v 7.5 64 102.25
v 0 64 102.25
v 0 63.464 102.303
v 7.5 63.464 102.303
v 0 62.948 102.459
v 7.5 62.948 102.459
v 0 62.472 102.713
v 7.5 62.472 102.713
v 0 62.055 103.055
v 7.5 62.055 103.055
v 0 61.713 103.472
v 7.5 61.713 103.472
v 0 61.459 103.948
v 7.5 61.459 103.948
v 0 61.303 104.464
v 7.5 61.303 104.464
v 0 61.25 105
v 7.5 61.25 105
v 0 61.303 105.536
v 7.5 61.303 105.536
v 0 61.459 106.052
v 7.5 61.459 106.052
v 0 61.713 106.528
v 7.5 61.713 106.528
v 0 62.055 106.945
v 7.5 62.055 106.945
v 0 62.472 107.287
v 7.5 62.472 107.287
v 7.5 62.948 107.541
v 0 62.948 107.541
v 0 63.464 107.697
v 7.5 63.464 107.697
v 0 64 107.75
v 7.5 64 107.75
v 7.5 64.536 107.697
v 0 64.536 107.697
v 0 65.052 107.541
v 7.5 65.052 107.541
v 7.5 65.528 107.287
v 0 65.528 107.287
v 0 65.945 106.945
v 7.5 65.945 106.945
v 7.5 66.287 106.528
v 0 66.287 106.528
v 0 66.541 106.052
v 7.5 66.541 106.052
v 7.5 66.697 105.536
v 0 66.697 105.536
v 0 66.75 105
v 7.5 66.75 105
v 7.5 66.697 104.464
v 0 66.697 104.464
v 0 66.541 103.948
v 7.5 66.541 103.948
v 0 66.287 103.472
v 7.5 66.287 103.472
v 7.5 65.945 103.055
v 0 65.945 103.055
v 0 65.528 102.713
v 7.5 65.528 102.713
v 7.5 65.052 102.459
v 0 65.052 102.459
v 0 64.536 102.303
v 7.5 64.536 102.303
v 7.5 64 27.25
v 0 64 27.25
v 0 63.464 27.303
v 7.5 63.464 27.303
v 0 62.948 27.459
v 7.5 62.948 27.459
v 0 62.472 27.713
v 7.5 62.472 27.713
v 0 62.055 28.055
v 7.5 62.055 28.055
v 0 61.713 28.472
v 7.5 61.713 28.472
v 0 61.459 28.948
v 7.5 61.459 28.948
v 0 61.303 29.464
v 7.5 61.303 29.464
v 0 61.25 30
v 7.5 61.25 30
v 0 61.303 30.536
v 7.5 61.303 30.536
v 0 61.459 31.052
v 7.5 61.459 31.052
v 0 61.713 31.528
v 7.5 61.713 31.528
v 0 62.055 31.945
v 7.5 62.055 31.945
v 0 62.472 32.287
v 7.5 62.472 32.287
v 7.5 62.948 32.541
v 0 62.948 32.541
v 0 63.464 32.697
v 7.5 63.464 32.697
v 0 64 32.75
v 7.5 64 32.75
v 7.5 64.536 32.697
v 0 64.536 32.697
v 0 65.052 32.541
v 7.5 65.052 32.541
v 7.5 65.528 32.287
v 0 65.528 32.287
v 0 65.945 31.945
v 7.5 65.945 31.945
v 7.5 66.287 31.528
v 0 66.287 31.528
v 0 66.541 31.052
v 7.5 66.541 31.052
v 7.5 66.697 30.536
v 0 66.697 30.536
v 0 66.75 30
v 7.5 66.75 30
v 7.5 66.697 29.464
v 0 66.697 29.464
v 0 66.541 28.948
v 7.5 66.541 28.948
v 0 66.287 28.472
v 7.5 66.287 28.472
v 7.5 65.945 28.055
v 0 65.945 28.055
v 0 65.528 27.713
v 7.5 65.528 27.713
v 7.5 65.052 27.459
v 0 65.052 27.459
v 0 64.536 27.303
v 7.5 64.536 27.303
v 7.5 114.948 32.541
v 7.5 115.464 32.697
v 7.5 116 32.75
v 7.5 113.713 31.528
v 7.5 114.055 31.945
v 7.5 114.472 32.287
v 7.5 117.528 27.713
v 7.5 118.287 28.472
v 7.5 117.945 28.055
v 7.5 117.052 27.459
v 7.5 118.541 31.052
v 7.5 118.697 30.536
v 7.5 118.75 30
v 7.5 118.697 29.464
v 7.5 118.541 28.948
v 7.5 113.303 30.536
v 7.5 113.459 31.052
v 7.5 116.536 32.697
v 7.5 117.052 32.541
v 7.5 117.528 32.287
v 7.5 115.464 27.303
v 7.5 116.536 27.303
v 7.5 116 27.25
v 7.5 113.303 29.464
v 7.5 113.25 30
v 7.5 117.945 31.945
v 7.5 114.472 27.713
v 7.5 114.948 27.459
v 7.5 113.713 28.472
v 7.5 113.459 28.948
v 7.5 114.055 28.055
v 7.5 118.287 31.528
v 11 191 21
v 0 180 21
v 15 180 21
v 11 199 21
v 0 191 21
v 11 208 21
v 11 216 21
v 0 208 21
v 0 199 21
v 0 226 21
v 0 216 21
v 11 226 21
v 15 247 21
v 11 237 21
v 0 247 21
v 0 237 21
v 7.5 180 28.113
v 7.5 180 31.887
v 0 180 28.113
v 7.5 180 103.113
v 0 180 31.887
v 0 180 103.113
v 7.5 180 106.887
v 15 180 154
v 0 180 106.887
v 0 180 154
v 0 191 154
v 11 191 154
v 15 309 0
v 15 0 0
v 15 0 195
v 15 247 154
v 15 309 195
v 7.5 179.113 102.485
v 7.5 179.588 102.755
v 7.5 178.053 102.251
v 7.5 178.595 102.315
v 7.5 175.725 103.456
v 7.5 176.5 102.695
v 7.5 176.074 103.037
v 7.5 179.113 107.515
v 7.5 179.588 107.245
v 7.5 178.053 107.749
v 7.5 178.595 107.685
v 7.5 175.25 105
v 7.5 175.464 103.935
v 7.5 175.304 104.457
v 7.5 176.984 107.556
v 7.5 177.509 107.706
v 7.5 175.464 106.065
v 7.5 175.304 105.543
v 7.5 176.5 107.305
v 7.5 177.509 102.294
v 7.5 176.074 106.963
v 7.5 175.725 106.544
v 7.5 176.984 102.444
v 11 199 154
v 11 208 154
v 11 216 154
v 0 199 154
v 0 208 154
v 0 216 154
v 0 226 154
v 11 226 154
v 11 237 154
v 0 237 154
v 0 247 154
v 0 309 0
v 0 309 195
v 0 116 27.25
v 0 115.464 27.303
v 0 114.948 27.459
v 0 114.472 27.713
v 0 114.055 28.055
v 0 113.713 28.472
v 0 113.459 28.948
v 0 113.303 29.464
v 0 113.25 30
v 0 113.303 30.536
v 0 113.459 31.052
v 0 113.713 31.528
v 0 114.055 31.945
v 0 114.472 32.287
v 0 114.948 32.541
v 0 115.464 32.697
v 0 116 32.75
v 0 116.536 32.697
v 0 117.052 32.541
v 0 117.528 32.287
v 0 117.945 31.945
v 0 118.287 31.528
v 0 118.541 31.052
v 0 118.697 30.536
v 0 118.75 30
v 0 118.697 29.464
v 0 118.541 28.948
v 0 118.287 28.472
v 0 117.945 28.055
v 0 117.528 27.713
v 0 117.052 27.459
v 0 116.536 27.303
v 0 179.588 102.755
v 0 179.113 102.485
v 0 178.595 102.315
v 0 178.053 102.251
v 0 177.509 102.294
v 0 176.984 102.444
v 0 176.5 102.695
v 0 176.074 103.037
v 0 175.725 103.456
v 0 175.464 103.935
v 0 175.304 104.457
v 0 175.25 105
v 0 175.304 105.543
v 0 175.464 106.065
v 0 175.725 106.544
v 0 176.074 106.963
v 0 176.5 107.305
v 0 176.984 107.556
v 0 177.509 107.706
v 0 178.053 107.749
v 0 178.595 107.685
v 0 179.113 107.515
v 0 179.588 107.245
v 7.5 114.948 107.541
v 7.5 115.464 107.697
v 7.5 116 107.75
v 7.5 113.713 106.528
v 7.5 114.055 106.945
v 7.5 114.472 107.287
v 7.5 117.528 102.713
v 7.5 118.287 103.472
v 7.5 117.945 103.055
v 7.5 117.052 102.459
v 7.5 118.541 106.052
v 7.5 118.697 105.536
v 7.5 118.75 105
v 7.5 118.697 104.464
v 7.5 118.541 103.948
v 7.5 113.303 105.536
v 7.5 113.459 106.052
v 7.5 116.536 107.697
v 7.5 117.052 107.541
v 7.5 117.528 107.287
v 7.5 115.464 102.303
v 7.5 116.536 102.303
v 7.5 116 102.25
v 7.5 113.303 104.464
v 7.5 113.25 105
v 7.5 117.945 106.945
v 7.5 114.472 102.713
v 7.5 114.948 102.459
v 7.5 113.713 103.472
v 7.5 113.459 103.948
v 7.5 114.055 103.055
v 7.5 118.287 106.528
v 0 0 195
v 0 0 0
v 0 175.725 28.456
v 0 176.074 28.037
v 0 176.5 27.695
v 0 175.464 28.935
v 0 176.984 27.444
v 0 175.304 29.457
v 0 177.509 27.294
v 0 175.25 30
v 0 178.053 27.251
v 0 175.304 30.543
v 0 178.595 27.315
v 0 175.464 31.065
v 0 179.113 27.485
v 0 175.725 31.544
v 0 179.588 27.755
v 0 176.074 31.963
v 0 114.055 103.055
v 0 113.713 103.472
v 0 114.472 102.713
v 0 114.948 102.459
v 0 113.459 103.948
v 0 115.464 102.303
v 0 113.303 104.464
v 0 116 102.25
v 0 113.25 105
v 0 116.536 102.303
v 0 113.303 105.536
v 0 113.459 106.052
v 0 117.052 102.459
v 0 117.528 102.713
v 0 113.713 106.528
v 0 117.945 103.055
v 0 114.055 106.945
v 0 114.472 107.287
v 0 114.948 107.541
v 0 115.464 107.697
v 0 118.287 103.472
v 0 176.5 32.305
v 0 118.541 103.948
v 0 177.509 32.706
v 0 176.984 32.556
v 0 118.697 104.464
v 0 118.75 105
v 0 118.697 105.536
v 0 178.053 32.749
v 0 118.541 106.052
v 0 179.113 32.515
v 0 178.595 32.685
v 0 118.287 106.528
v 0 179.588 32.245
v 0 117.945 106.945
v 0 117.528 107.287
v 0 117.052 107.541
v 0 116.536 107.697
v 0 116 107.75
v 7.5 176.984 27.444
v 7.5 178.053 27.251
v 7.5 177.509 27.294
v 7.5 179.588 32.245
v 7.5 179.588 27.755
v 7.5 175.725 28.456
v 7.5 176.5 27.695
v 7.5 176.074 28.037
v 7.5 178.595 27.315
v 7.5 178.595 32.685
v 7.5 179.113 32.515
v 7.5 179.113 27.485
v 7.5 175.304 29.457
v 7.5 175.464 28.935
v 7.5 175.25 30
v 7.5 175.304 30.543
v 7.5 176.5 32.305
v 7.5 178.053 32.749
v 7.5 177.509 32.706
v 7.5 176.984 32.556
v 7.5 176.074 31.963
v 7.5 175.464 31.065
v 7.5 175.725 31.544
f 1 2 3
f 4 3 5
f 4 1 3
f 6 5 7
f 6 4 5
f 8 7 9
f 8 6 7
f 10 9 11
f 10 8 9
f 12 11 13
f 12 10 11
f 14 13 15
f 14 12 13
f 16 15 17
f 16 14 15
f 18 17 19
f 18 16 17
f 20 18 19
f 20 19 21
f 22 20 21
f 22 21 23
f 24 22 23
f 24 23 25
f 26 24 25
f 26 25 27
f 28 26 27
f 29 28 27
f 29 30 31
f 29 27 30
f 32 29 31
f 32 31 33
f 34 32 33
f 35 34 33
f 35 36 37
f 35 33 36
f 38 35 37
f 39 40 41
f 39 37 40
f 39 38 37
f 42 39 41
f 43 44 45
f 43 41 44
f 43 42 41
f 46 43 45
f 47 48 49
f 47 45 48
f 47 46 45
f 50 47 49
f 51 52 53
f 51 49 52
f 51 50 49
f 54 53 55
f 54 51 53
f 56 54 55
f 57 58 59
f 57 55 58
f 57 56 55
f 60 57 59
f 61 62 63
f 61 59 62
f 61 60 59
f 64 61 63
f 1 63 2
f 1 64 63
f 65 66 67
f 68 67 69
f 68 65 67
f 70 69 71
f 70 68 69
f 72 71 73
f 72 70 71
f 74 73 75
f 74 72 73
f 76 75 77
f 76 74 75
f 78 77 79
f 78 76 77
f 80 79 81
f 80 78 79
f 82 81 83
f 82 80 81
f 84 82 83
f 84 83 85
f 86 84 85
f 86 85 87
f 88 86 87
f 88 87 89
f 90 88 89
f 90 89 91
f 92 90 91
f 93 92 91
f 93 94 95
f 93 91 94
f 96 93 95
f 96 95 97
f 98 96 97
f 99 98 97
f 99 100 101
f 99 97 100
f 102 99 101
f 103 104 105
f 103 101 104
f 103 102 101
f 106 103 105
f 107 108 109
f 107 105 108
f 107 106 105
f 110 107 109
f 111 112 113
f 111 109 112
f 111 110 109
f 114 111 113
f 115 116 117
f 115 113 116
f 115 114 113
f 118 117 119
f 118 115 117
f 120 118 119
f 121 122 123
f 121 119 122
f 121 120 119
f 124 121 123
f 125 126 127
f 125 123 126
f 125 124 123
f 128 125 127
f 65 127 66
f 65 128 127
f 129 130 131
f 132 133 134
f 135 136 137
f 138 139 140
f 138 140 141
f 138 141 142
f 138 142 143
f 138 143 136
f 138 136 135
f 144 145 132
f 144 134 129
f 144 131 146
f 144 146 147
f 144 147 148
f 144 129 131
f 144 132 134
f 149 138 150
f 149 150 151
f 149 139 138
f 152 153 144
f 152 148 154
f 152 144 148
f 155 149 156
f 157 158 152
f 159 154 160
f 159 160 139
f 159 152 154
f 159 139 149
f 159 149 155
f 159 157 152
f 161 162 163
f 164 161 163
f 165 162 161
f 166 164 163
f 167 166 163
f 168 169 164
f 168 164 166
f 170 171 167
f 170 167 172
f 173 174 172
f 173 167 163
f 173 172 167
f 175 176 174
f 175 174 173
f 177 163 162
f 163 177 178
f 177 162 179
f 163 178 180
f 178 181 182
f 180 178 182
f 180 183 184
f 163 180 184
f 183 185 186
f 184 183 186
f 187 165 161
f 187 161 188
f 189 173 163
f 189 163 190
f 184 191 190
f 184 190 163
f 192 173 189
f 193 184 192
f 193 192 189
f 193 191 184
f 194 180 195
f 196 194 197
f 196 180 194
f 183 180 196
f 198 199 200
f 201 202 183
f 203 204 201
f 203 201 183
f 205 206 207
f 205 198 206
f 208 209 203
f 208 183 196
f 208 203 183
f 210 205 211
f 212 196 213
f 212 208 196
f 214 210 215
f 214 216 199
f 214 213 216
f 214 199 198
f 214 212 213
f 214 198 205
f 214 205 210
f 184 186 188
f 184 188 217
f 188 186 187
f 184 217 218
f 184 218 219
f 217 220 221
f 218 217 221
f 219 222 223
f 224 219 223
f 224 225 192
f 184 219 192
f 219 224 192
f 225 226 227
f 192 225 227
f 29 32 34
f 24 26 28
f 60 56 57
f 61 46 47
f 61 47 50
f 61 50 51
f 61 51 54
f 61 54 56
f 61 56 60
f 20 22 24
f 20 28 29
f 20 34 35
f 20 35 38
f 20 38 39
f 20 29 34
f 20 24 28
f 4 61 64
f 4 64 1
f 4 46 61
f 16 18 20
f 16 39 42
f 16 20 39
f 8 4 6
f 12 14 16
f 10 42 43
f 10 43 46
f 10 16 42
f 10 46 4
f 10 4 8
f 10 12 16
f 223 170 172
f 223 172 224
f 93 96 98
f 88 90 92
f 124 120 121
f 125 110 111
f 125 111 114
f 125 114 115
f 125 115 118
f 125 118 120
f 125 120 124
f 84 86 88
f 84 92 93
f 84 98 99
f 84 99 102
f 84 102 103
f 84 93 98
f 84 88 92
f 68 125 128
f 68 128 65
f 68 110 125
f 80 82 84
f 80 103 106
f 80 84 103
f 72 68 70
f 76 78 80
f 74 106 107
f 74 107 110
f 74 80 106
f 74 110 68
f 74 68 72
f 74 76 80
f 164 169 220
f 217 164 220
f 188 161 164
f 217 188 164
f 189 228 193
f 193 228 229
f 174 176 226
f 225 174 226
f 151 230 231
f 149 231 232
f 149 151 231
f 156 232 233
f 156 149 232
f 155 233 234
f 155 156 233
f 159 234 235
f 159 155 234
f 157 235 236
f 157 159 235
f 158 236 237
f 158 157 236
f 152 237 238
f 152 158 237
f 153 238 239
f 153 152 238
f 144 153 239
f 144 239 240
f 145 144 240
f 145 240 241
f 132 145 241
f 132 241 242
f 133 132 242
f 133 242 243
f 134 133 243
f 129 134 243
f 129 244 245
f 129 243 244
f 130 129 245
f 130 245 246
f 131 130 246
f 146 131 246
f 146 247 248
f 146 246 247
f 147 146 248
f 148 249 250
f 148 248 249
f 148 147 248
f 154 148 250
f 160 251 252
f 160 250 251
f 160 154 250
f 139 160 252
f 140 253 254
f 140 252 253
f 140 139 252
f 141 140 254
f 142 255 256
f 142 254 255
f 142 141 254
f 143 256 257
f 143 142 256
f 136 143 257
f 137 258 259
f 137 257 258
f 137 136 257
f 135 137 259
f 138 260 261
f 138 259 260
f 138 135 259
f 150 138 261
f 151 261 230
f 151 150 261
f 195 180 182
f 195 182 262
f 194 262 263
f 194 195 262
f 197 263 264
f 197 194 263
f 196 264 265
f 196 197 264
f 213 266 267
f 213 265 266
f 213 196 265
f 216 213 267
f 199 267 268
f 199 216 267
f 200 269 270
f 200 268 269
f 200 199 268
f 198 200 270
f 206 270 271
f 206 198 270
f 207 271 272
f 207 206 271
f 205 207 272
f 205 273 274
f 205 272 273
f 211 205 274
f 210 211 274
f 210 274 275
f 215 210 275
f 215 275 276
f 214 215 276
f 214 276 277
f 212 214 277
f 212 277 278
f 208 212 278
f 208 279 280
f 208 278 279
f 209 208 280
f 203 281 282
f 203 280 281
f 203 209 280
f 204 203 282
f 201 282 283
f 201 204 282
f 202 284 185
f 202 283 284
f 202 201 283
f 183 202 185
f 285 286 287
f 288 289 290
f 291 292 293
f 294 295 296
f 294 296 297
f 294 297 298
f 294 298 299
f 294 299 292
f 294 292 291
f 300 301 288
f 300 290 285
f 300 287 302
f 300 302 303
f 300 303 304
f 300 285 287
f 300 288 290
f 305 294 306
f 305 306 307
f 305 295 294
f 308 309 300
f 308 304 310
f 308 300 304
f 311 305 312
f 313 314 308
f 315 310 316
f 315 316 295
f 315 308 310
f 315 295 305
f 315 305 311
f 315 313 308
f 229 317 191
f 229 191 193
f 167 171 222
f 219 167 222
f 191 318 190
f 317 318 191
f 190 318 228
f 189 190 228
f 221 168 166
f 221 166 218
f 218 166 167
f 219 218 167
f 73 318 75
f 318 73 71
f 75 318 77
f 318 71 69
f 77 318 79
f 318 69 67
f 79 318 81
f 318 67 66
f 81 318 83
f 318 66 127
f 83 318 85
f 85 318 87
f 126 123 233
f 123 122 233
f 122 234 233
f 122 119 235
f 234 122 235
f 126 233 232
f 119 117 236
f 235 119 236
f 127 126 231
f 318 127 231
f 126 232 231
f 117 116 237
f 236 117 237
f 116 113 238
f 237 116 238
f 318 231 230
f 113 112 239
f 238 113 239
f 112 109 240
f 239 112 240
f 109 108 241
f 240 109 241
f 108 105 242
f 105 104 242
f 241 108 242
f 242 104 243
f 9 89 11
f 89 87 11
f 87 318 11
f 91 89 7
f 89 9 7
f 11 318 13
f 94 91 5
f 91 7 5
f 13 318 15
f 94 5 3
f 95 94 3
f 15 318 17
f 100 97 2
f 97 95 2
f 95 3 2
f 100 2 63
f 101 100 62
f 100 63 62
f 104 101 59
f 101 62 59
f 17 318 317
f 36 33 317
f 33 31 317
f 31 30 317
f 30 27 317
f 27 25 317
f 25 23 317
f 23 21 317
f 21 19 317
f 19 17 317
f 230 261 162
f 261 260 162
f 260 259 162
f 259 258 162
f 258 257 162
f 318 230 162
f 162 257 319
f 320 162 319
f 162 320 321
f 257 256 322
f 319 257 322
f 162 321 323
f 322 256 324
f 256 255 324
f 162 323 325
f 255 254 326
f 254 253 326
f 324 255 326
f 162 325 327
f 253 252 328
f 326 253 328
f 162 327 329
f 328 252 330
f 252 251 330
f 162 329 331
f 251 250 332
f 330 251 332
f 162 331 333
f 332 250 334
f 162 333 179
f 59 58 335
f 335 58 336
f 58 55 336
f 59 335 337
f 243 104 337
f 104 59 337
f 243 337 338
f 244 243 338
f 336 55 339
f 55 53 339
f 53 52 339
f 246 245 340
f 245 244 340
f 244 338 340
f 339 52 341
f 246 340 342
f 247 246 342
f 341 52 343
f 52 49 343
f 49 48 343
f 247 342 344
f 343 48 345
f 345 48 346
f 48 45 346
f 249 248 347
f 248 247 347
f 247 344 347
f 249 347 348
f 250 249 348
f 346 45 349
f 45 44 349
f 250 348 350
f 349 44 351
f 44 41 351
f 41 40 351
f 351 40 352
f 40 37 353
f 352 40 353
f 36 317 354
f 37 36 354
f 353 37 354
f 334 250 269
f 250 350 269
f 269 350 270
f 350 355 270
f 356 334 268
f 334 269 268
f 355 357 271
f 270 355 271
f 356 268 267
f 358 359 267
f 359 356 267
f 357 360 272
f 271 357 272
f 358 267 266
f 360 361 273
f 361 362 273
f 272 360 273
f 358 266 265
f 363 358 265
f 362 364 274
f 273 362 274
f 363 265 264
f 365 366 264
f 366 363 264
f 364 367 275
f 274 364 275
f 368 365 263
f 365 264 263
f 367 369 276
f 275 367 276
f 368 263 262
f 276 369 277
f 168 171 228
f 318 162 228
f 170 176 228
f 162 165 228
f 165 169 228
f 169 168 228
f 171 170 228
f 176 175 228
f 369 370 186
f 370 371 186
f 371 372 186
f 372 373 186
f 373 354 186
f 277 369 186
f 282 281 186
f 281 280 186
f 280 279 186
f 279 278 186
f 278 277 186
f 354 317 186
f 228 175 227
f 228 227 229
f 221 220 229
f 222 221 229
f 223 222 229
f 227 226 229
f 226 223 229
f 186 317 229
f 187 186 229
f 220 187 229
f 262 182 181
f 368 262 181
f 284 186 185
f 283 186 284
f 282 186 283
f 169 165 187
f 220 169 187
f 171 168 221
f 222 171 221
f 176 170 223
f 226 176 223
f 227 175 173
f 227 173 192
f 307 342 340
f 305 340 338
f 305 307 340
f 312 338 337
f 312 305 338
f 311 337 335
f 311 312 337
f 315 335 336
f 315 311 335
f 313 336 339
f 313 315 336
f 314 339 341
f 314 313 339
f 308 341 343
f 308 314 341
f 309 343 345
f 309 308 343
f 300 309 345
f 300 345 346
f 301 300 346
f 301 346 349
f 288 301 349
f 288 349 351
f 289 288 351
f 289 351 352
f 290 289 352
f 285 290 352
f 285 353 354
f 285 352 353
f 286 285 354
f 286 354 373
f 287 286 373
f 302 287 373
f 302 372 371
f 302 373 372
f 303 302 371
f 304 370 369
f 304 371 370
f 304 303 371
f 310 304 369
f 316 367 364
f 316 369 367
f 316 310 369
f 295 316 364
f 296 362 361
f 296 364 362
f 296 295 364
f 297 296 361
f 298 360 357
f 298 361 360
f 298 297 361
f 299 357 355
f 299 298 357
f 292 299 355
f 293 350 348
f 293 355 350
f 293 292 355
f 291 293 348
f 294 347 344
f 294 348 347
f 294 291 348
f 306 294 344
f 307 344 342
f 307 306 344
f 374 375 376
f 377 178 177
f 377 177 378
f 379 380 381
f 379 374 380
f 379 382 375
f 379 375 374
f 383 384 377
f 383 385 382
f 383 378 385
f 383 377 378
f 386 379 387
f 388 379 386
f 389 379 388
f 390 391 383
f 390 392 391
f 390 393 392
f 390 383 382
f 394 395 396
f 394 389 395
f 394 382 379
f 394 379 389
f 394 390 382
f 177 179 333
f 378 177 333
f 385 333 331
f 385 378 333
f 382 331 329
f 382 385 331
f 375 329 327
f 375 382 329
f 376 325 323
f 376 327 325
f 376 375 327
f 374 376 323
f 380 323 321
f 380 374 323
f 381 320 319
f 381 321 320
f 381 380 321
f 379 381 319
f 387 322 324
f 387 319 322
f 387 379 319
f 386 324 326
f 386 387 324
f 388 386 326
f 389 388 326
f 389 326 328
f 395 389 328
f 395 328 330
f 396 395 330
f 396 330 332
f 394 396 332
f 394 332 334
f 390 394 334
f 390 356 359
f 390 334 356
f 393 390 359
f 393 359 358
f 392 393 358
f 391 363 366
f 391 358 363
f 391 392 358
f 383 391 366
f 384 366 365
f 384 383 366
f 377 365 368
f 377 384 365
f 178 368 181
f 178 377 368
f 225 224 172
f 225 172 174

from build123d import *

# Parameters (mm, degrees)
CROQUIS1_W                 = 309
CROQUIS1_H                 = 195
CROQUIS1_W_2               = 11
CROQUIS1_H_2               = 133
CROQUIS1_W_3               = 9
CROQUIS1_W_4               = 10
SALIENTE_EXTRUIR1_DEPTH    = 15
CROQUIS2_W                 = 67
CROQUIS2_H                 = 133
CORTAR_EXTRUIR2_DEPTH      = 4
CORTAR_EXTRUIR3_DEPTH      = 366.69249377
CORTAR_EXTRUIR3_DEPTH_BACK = 7.5
CROQUIS3_R                 = 2.75


with BuildPart() as part:
    # Croquis1 → Saliente-Extruir1 (new body)
    with BuildSketch(Plane.YZ):
        with Locations((154.5, 97.5)):
            Rectangle(CROQUIS1_W, CROQUIS1_H)
        with Locations((185.5, 87.5)):
            Rectangle(CROQUIS1_W_2, CROQUIS1_H_2, mode=Mode.SUBTRACT)
        with Locations((203.5, 87.5)):
            Rectangle(CROQUIS1_W_3, CROQUIS1_H_2, mode=Mode.SUBTRACT)
        with Locations((221, 87.5)):
            Rectangle(CROQUIS1_W_4, CROQUIS1_H_2, mode=Mode.SUBTRACT)
        with Locations((242, 87.5)):
            Rectangle(CROQUIS1_W_4, CROQUIS1_H_2, mode=Mode.SUBTRACT)
    extrude(amount=SALIENTE_EXTRUIR1_DEPTH)

    # Croquis2 → Cortar-Extruir2 (cut)
    with BuildSketch(Plane.YZ.offset(15)):
        with Locations((213.5, 87.5)):
            Rectangle(CROQUIS2_W, CROQUIS2_H)
    extrude(amount=-CORTAR_EXTRUIR2_DEPTH, mode=Mode.SUBTRACT)

    # Croquis3 → Cortar-Extruir3 (cut, two sides: drawn at the far end of the back side and taken through both)
    with BuildSketch(Plane(origin=(0, 0, 0), x_dir=(0, -1, 0), z_dir=(-1, 0, 0)).offset(-CORTAR_EXTRUIR3_DEPTH_BACK)):
        with Locations(Location((-116, 105, 0), (0, 0, 270))):
            Circle(CROQUIS3_R)
        with Locations(Location((-64, 105, 0), (0, 0, 270))):
            Circle(CROQUIS3_R)
        with Locations(Location((-64, 30, 0), (0, 0, 270))):
            Circle(CROQUIS3_R)
        with Locations((-178, 105)):
            Circle(CROQUIS3_R)
        with Locations((-178, 30)):
            Circle(CROQUIS3_R)
        with Locations(Location((-116, 30, 0), (0, 0, 270))):
            Circle(CROQUIS3_R)
    extrude(amount=CORTAR_EXTRUIR3_DEPTH + CORTAR_EXTRUIR3_DEPTH_BACK, mode=Mode.SUBTRACT)


solid = part.part
